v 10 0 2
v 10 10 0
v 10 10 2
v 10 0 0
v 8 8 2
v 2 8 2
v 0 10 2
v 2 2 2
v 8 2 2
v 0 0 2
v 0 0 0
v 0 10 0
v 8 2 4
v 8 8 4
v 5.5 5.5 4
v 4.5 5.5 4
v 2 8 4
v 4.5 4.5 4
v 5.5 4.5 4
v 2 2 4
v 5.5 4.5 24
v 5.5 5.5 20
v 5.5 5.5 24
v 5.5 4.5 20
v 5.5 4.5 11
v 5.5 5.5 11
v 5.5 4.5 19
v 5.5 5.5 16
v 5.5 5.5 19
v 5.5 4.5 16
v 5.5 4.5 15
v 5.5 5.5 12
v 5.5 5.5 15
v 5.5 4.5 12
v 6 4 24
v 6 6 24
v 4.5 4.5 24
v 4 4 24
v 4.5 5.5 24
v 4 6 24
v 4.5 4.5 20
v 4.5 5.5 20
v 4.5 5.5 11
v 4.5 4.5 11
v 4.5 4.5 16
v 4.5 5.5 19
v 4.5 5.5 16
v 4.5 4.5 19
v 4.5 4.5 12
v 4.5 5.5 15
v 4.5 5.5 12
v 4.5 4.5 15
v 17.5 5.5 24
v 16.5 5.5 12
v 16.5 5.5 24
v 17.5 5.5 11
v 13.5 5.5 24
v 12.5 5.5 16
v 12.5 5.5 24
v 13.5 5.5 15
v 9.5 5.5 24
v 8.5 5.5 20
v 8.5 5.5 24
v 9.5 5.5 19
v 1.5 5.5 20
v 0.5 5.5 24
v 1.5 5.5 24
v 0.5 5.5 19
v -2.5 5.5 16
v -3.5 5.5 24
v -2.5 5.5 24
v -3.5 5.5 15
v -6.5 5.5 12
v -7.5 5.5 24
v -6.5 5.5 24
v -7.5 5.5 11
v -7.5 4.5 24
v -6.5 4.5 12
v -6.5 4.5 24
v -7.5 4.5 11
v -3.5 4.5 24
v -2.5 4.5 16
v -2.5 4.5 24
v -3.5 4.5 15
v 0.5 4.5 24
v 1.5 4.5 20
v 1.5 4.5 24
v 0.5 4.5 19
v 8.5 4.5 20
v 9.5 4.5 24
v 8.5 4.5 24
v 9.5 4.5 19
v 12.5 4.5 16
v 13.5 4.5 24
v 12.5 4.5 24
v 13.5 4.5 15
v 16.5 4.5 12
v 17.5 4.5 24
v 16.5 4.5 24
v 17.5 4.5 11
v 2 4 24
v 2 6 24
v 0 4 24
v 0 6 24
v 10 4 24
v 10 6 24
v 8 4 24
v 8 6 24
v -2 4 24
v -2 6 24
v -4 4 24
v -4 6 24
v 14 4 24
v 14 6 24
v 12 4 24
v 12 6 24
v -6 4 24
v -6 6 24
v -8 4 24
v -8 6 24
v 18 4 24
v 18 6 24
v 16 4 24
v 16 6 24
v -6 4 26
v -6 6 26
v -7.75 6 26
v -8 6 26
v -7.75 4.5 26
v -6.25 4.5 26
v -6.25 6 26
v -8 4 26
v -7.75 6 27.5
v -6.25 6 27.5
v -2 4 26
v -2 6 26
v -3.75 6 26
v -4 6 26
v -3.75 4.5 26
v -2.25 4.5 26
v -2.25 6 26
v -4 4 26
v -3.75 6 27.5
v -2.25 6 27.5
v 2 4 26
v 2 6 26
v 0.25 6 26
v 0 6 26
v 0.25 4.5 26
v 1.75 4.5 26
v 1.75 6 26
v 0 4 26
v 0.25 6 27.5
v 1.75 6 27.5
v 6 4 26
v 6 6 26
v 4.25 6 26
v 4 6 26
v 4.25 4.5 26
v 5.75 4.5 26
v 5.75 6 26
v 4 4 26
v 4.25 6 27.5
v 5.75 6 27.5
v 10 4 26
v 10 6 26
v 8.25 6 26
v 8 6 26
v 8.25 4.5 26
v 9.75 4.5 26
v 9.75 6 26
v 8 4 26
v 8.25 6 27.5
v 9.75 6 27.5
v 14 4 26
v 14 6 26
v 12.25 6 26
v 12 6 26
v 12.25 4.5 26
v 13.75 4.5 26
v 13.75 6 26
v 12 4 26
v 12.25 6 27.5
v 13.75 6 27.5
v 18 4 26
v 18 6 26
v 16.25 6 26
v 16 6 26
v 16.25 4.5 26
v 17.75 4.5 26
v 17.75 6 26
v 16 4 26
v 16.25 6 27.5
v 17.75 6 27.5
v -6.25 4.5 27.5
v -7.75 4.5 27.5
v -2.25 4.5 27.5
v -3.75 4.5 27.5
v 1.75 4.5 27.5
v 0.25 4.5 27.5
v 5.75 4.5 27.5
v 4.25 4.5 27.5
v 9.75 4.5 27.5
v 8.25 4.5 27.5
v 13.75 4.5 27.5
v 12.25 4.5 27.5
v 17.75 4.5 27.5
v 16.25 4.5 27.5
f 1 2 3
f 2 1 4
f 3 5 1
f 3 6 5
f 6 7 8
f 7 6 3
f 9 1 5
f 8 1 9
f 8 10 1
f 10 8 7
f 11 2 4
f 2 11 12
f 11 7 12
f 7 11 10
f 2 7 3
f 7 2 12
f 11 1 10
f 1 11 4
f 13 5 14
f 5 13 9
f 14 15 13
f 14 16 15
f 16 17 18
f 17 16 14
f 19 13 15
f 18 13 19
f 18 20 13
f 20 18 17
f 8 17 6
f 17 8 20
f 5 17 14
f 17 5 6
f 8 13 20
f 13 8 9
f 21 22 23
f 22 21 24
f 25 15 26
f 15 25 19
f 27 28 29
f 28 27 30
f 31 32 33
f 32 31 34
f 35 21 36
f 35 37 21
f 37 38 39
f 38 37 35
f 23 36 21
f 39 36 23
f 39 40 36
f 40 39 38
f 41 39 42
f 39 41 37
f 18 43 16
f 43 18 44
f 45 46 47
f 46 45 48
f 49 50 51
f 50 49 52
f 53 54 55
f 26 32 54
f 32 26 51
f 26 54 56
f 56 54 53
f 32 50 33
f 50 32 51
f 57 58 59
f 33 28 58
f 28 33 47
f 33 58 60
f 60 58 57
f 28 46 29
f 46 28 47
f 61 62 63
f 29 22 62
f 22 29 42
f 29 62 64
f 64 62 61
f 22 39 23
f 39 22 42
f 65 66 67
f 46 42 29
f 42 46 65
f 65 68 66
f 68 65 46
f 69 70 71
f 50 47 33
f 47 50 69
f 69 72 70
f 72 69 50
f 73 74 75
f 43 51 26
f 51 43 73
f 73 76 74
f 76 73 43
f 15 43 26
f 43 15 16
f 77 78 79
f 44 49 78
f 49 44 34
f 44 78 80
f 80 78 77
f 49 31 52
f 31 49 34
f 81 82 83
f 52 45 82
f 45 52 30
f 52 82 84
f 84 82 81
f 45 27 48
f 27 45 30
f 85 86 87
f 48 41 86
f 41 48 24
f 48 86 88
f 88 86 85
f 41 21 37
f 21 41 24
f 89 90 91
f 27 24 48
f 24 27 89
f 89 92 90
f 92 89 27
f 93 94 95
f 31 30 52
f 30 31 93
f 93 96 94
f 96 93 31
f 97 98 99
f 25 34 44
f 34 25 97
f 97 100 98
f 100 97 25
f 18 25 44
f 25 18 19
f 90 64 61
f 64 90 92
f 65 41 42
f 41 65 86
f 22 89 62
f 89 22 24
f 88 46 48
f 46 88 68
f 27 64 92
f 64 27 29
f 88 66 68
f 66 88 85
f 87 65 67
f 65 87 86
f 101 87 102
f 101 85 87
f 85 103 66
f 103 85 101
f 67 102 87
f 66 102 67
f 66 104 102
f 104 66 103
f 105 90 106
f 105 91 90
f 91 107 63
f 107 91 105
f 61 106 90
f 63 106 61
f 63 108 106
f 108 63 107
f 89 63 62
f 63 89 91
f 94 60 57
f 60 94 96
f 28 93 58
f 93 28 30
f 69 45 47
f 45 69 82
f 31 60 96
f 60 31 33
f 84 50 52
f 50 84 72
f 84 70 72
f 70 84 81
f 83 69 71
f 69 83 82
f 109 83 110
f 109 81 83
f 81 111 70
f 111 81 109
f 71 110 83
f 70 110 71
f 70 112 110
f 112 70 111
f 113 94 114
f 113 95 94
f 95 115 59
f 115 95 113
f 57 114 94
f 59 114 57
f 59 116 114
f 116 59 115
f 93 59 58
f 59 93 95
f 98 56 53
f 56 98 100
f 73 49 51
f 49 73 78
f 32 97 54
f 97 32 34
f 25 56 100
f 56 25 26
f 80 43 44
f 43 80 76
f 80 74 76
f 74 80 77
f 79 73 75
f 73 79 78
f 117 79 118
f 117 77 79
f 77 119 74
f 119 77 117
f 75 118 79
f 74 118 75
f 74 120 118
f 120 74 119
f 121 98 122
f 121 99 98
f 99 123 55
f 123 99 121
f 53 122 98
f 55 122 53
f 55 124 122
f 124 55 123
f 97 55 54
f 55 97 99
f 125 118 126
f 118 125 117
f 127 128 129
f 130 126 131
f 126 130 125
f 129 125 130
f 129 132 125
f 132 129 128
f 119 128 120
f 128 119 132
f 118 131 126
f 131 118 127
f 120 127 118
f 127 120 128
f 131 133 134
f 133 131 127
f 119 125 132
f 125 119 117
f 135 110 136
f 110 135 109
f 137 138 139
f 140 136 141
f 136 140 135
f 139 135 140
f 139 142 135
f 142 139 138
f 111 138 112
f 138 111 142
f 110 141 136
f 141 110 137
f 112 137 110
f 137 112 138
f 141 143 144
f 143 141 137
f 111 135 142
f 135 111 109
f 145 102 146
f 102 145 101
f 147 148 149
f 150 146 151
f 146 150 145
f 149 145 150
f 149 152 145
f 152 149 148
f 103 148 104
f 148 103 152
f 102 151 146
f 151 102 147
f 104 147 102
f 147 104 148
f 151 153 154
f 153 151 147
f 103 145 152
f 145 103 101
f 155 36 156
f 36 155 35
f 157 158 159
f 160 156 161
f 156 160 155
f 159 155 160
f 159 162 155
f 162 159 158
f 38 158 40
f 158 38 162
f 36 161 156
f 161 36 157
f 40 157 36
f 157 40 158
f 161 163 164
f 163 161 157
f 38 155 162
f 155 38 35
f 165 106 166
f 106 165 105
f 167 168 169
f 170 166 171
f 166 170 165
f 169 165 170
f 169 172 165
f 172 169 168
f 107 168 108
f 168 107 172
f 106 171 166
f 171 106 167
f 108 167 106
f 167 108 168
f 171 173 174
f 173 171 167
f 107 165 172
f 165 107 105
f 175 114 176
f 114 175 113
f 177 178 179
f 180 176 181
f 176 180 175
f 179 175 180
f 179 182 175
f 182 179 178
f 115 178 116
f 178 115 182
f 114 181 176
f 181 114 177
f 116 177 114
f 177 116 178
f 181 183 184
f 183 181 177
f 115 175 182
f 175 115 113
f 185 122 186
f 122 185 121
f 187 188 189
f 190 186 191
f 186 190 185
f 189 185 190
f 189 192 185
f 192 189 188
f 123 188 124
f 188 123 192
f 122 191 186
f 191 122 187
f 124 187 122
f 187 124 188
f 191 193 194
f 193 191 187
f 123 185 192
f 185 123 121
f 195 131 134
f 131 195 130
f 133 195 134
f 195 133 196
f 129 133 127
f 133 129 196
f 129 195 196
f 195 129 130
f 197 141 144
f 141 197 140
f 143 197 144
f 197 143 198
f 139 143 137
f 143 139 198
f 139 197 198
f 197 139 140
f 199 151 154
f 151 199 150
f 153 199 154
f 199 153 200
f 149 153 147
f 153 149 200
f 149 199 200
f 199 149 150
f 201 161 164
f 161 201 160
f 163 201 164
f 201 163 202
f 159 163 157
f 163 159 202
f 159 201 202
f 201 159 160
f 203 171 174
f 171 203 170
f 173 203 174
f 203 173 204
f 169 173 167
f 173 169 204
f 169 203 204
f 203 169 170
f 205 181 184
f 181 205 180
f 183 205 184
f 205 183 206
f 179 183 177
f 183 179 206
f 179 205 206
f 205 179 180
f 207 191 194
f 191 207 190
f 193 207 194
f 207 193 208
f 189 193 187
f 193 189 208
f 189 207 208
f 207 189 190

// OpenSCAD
module flame() { cube([1.5, 1.5, 1.5]); }
module top() { cube([2, 2, 2]); }
module stem(height) { cube([1, 1, height]); }
module branch(width) { cube([width, 1, 1]); }

module base() {
  cube([10, 10, 2]);
  translate([2, 2, 2]) cube([6, 6, 2]);
}

module temple_menorah() {
  color("gold") {
    base();

    translate([4.5, 4.5, 4]) stem(20);

    // top tier (center 3)
    translate([0.5, 4.5, 19]) branch(9);
    translate([0.5, 4.5, 19]) stem(5);
    translate([8.5, 4.5, 19]) stem(5);

    // mid tier (center 2 and 6)
    translate([-3.5, 4.5, 15]) branch(17);
    translate([-3.5, 4.5, 15]) stem(9);
    translate([12.5, 4.5, 15]) stem(9);

    // bottom tier (center 1 and 7)
    translate([-7.5, 4.5, 11]) branch(25);
    translate([-7.5, 4.5, 11]) stem(13);
    translate([16.5, 4.5, 11]) stem(13);

    translate([-8, 4, 24]) top();
    translate([-4, 4, 24]) top();
    translate([0, 4, 24]) top();
    translate([4, 4, 24]) top();
    translate([8, 4, 24]) top();
    translate([12, 4, 24]) top();
    translate([16, 4, 24]) top();
  }

  color("orange") {
    translate([-8 + 0.25, 4.5, 26]) flame();
    translate([-4 + 0.25, 4.5, 26]) flame();
    translate([0 + 0.25, 4.5, 26]) flame();
    translate([4 + 0.25, 4.5, 26]) flame();
    translate([8 + 0.25, 4.5, 26]) flame();
    translate([12 + 0.25, 4.5, 26]) flame();
    translate([16 + 0.25, 4.5, 26]) flame();
  }
}

//// uncomment below to convert it to the Minecraft coordinate system
// translate([-10, 0, 10])
//  rotate([-90, 0, 0])
temple_menorah();
